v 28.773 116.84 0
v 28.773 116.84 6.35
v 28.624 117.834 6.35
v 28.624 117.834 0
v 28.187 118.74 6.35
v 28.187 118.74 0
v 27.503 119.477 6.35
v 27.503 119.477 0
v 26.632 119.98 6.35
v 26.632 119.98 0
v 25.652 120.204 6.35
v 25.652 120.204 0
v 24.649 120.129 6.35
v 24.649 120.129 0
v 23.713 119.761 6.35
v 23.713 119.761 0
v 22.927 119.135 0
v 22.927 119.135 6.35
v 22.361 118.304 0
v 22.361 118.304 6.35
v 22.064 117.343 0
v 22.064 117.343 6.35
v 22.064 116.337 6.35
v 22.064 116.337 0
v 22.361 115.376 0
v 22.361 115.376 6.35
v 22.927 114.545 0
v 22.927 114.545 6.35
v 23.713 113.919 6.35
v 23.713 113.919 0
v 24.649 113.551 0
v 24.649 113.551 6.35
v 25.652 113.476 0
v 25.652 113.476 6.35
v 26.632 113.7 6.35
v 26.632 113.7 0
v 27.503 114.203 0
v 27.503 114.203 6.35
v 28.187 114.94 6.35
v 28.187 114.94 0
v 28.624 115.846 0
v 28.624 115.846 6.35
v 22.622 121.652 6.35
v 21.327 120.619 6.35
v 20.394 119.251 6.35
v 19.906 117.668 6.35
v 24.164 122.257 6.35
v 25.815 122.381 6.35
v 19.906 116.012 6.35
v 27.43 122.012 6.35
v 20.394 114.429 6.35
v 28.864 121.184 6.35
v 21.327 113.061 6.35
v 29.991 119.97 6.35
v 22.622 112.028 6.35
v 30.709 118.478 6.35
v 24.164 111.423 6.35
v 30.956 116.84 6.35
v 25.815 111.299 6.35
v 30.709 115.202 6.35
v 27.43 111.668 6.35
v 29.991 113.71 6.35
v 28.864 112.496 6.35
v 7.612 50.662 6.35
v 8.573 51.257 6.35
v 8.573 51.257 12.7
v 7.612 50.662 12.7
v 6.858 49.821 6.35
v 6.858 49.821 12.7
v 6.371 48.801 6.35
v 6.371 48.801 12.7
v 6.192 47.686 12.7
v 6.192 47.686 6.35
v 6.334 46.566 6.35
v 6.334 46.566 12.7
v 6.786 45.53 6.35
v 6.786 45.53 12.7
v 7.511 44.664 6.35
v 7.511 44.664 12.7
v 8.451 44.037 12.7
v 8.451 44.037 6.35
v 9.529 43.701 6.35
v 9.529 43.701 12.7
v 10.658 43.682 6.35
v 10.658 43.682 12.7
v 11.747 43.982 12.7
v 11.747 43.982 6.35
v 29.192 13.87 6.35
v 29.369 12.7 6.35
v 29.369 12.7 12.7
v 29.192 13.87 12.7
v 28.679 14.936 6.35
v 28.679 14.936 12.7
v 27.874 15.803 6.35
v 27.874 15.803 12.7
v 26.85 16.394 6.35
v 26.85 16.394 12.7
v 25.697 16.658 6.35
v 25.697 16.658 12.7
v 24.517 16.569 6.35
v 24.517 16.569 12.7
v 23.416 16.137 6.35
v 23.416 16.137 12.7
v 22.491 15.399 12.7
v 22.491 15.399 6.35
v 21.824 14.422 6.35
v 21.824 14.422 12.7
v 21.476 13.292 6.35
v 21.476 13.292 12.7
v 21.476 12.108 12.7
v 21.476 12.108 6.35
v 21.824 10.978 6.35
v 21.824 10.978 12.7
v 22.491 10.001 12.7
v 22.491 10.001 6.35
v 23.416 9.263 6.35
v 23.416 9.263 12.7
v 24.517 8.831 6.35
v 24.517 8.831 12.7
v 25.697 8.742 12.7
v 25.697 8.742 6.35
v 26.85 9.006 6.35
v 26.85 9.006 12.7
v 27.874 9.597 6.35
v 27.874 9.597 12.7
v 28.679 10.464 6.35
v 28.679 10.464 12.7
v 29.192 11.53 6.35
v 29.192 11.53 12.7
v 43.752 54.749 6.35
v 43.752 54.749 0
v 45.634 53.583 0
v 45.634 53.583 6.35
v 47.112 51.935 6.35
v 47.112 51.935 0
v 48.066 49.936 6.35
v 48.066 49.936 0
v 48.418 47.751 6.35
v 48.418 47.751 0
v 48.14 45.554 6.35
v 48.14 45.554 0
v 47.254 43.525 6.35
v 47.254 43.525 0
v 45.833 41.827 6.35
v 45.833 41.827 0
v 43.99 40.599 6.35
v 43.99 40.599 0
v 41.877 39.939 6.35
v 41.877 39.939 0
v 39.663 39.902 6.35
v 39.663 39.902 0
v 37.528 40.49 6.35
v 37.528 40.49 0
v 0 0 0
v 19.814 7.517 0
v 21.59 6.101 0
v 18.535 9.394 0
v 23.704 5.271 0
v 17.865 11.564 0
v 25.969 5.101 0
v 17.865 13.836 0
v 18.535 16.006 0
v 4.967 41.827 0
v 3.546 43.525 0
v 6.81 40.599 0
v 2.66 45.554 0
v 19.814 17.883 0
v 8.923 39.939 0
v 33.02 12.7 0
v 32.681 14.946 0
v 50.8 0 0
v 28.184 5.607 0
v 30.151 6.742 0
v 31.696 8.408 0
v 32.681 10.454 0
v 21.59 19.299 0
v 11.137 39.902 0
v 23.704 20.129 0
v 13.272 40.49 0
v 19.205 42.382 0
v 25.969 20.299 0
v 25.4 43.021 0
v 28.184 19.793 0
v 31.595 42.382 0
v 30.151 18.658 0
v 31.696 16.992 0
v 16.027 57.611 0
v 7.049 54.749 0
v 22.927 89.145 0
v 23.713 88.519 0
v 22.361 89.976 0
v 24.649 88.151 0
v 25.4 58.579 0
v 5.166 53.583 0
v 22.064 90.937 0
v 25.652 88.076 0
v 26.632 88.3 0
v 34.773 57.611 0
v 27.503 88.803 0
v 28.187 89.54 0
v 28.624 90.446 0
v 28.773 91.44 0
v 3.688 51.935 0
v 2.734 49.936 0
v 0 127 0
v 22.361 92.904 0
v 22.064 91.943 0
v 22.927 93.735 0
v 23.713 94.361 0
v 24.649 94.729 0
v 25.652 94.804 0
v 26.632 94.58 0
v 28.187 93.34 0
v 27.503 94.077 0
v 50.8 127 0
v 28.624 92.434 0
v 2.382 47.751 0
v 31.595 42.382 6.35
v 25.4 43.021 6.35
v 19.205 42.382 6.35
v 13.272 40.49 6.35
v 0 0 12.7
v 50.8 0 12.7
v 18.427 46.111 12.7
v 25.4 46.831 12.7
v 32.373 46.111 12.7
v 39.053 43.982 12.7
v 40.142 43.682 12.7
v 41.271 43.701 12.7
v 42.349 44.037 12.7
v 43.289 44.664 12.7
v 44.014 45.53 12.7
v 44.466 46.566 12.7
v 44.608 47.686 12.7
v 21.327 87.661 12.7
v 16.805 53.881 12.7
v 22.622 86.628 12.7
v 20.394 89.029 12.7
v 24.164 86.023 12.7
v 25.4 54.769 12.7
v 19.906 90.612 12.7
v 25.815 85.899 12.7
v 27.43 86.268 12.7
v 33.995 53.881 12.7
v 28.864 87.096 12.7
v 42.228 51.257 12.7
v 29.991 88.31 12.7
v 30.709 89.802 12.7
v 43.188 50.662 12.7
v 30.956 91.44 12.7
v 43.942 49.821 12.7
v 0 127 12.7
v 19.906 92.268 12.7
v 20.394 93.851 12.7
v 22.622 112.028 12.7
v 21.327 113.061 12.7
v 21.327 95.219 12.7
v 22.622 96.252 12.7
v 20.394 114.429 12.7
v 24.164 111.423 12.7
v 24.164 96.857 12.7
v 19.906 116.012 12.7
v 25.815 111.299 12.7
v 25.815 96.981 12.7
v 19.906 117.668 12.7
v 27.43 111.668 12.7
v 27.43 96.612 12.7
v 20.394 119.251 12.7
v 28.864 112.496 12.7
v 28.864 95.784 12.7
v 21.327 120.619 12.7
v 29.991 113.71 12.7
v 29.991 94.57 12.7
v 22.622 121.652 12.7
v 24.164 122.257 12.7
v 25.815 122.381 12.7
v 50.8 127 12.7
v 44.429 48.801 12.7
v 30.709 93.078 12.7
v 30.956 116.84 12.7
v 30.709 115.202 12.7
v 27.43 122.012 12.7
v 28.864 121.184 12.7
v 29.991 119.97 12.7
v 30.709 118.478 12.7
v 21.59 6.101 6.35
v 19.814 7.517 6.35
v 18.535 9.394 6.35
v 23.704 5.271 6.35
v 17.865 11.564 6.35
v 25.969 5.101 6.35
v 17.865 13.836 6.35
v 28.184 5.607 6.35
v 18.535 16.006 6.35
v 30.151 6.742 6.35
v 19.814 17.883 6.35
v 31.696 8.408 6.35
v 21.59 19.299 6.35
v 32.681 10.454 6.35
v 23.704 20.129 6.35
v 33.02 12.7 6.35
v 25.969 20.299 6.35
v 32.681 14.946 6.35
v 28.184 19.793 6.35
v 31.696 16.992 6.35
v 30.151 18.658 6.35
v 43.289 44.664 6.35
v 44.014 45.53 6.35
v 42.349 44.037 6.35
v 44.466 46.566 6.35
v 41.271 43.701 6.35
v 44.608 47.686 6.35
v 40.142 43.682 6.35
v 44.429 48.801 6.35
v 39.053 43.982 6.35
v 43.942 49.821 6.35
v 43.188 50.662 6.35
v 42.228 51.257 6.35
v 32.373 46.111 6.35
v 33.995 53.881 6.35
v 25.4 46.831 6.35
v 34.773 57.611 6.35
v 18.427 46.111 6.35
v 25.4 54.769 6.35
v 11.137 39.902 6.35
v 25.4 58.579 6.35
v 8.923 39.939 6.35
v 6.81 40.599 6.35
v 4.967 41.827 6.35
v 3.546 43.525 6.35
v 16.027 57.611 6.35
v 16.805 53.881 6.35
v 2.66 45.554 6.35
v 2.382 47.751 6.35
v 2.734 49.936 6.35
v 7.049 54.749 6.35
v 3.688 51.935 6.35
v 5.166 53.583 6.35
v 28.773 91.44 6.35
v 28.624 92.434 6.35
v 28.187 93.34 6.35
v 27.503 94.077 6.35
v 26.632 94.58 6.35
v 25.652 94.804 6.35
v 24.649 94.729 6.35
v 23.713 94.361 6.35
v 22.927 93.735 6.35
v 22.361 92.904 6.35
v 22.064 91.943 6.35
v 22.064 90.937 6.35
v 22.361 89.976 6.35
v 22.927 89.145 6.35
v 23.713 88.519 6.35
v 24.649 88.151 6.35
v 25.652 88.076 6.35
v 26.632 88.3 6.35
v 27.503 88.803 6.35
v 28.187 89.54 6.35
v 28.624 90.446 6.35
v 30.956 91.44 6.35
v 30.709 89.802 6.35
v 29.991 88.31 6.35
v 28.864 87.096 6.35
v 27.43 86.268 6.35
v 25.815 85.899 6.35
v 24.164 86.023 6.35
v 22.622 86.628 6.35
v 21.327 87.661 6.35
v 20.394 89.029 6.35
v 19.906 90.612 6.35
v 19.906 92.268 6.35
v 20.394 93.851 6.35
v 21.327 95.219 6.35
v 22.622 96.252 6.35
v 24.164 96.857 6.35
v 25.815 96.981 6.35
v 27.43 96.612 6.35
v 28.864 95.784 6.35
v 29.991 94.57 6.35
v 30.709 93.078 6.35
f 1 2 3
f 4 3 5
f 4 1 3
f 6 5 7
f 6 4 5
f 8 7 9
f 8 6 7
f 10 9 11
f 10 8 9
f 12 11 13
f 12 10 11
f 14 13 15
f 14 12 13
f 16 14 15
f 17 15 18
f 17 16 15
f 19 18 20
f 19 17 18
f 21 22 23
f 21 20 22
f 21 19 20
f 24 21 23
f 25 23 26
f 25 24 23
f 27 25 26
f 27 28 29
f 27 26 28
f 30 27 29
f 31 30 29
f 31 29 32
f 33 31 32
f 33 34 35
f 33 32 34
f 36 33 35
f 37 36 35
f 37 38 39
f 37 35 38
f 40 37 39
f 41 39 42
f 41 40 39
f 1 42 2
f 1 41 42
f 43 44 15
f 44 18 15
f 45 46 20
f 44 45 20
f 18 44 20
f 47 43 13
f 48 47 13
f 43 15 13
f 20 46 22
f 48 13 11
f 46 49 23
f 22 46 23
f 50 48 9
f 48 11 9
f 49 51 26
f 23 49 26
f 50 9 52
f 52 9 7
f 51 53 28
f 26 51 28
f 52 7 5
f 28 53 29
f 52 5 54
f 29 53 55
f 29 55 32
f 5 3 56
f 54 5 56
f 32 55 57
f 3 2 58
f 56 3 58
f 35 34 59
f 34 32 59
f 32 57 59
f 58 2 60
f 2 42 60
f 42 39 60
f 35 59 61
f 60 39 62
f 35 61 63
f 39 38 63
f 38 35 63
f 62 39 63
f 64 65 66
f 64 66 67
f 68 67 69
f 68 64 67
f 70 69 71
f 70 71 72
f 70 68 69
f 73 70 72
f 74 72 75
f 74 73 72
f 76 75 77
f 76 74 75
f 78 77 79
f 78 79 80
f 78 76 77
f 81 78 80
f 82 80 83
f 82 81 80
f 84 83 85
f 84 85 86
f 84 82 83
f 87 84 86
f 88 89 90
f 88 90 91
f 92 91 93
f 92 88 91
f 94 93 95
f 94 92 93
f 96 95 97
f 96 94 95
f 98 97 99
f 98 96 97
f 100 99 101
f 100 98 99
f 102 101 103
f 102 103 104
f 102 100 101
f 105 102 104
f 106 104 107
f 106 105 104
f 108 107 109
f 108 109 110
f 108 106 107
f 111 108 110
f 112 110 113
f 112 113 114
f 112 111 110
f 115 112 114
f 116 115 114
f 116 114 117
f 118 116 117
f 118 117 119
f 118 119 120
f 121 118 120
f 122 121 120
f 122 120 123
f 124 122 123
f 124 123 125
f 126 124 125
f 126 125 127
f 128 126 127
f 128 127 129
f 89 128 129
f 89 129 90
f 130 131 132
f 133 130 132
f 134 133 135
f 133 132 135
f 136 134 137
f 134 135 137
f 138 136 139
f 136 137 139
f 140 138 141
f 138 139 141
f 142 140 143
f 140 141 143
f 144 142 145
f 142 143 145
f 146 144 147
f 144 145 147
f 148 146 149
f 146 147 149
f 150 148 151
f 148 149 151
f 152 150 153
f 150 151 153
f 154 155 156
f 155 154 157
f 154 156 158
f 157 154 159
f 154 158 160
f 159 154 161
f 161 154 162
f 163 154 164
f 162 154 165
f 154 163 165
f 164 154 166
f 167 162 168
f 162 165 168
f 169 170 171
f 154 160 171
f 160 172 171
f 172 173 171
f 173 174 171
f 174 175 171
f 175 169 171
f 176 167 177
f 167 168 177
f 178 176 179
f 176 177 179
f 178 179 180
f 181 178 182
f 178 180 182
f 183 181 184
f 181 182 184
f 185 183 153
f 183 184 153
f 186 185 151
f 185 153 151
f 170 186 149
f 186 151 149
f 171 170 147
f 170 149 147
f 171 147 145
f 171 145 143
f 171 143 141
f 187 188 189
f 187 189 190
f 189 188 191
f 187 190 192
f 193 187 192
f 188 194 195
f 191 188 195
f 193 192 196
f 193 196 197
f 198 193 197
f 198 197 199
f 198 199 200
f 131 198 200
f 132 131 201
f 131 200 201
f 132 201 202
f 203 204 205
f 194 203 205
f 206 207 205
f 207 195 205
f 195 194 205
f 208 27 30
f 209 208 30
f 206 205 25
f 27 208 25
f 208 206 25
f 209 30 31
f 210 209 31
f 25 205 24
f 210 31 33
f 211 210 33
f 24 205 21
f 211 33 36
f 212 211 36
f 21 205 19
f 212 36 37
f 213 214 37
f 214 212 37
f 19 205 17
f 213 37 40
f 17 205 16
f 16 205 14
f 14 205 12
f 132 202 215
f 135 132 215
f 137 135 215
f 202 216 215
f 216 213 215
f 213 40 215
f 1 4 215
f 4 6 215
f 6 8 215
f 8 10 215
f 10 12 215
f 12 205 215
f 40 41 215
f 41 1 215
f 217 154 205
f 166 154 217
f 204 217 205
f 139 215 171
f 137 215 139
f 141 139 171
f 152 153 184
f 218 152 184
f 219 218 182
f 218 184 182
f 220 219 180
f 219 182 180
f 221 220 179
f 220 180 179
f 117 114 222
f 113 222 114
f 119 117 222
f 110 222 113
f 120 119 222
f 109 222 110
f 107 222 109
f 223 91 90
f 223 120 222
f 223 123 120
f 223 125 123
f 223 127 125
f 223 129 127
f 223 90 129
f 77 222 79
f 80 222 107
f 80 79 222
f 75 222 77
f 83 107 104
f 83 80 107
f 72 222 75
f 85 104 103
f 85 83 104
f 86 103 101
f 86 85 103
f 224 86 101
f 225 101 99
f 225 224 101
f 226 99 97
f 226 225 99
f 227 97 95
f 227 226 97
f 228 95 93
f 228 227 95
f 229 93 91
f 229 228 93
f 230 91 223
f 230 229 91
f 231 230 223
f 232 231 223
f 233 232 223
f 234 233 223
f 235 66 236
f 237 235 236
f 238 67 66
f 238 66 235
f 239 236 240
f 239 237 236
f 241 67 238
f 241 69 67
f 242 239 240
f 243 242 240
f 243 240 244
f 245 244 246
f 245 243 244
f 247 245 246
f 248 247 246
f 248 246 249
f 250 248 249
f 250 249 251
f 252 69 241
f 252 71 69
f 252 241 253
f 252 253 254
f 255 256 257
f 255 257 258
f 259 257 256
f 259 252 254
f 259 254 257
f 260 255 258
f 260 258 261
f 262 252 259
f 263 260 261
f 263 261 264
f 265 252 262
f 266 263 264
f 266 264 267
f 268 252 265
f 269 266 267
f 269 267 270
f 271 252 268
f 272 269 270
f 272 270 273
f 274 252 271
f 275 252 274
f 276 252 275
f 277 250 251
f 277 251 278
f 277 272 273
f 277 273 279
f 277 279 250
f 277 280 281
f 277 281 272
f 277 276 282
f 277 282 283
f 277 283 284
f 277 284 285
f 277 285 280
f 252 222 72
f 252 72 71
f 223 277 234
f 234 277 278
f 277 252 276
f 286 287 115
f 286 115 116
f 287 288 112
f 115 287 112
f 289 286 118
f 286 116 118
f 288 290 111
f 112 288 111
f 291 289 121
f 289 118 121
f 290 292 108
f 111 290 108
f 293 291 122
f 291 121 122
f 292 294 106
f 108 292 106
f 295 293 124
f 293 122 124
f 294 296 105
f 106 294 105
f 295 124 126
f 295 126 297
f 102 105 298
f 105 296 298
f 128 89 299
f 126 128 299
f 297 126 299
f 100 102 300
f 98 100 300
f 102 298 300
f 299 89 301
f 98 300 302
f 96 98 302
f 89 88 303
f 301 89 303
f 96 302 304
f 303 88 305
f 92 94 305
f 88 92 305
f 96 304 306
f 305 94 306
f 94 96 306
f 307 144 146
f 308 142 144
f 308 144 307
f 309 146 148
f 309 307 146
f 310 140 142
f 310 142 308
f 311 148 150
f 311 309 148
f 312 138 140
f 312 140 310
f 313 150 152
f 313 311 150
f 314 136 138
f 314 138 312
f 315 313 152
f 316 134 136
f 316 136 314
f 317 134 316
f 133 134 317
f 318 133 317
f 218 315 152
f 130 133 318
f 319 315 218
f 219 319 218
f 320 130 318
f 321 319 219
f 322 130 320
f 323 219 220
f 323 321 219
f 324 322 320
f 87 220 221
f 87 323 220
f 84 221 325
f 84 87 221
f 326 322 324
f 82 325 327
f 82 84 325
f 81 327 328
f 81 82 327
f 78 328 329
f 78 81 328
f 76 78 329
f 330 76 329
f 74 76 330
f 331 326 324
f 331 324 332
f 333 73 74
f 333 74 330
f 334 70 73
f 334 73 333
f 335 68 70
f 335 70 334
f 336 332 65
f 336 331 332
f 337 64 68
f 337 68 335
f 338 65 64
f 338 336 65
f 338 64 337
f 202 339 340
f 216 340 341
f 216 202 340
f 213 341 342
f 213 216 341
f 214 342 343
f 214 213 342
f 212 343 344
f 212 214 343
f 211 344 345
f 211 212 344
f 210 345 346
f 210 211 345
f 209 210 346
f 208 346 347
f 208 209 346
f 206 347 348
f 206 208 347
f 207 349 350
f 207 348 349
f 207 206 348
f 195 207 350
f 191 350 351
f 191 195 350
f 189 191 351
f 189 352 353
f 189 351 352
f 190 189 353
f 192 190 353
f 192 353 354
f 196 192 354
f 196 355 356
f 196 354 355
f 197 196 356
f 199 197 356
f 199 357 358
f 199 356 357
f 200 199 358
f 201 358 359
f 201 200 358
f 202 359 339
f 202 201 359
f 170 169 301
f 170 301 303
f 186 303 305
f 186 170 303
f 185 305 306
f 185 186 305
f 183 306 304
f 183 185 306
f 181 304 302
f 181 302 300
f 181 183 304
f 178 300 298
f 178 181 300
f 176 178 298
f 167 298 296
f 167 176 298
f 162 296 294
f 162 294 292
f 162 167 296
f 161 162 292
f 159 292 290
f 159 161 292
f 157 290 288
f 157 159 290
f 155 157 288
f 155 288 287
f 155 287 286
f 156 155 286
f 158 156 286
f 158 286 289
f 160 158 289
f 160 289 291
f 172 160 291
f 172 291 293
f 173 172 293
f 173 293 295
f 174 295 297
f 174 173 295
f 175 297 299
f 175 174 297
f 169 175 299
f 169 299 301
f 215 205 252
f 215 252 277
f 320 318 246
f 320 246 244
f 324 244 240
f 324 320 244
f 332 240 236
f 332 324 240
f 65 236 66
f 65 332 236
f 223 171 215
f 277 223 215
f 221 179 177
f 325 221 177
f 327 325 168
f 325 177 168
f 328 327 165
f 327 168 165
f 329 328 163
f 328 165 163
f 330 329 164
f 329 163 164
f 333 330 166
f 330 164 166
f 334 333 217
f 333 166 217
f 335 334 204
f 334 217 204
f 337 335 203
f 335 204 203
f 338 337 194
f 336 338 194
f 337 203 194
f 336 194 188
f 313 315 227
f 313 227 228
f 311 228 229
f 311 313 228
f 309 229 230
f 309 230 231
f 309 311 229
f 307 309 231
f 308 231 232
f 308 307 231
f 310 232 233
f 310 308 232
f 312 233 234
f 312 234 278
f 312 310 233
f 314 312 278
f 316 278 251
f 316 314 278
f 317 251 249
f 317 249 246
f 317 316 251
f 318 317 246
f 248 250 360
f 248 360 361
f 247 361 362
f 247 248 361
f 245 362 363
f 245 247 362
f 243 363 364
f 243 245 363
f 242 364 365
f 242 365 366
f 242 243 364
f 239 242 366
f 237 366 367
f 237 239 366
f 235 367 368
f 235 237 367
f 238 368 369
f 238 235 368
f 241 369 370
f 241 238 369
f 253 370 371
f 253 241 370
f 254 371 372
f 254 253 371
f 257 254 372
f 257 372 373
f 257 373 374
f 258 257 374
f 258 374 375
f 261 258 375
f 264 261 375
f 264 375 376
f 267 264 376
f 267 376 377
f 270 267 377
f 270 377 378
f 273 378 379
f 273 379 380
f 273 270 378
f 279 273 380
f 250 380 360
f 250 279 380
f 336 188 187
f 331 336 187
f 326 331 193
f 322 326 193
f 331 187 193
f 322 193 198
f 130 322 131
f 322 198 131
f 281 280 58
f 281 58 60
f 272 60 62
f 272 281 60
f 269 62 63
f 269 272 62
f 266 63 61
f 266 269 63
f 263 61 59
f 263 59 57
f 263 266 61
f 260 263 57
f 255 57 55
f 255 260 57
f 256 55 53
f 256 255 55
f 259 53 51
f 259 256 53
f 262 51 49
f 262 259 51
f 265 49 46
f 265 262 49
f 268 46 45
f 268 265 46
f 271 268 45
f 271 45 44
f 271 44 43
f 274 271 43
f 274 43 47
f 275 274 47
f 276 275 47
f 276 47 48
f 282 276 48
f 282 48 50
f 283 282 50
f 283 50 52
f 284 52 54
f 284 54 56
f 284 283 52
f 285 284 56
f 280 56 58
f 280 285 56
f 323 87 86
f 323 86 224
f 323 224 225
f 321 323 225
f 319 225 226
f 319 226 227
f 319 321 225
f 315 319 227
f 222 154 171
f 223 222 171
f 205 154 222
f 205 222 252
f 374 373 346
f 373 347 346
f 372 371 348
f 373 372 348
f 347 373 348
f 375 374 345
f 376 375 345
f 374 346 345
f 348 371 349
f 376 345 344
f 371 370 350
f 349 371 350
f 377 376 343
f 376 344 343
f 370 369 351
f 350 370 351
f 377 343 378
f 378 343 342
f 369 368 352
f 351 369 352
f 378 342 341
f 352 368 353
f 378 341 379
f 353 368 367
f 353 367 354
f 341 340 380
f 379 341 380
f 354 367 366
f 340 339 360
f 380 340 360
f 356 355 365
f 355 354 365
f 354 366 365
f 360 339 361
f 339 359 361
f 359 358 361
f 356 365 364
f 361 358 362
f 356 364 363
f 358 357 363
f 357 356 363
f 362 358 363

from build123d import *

# Parameters (mm, degrees)
SKETCH1_W           = 50.8
SKETCH1_H           = 127
SKETCH1_R           = 3.96875
SKETCH1_R_2         = 3.3734375
BOSS_EXTRUDE2_DEPTH = 12.7
CUT_EXTRUDE1_DEPTH  = 6.35
CUT_EXTRUDE2_START  = -12.7
SKETCH3_R           = 5.55625
CUT_EXTRUDE2_DEPTH  = 6.35
CUT_EXTRUDE3_START  = -12.7
SKETCH4_R           = 7.62
CUT_EXTRUDE3_DEPTH  = 6.35


with BuildPart() as part:
    # Sketch1 → Boss-Extrude2 (new body)
    with BuildSketch(Plane.XY):
        with Locations((25.4, 63.5)):
            Rectangle(SKETCH1_W, SKETCH1_H)
        with Locations((25.4, 12.7)):
            Circle(SKETCH1_R, mode=Mode.SUBTRACT)
        with Locations((25.4, 116.84)):
            Circle(SKETCH1_R_2, mode=Mode.SUBTRACT)
        with Locations((25.4, 91.44)):
            Circle(SKETCH1_R_2, mode=Mode.SUBTRACT)
        with BuildLine():
            ThreePointArc((42.2275, 51.256646253), (25.4, 54.76875), (8.5725, 51.256646253))
            ThreePointArc((8.5725, 51.256646253), (6.522580542, 46.031726796), (11.7475, 43.981807338))
            ThreePointArc((11.7475, 43.981807338), (25.4, 46.83125), (39.0525, 43.981807338))
            ThreePointArc((39.0525, 43.981807338), (44.277419458, 46.031726796), (42.2275, 51.256646253))
        make_face(mode=Mode.SUBTRACT)
    extrude(amount=BOSS_EXTRUDE2_DEPTH)

    # Sketch1<3> → Cut-Extrude1 (cut)
    with BuildSketch(Plane.XY):
        with BuildLine():
            ThreePointArc((37.5285, 40.489884658), (25.4, 43.02125), (13.2715, 40.489884658))
            ThreePointArc((13.2715, 40.489884658), (3.030657863, 44.507726796), (7.0485, 54.748568933))
            ThreePointArc((7.0485, 54.748568933), (25.4, 58.57875), (43.7515, 54.748568933))
            ThreePointArc((43.7515, 54.748568933), (47.769342137, 44.507726796), (37.5285, 40.489884658))
        make_face()
        with BuildLine():
            ThreePointArc((39.0525, 43.981807338), (44.277419458, 46.031726796), (42.2275, 51.256646253))
            ThreePointArc((42.2275, 51.256646253), (25.4, 54.76875), (8.5725, 51.256646253))
            ThreePointArc((8.5725, 51.256646253), (6.522580542, 46.031726796), (11.7475, 43.981807338))
            ThreePointArc((11.7475, 43.981807338), (25.4, 46.83125), (39.0525, 43.981807338))
        make_face(mode=Mode.SUBTRACT)
    extrude(amount=CUT_EXTRUDE1_DEPTH, mode=Mode.SUBTRACT)

    # Sketch3 → Cut-Extrude2 (cut)
    with BuildSketch(Plane(origin=(0, 0, 0), x_dir=(-1, 0, 0), z_dir=(0, 0, -1)).offset(CUT_EXTRUDE2_START)):
        with Locations(Location((-25.4, 116.84, 0), (0, 0, 180))):
            Circle(SKETCH3_R)
        with Locations(Location((-25.4, 91.44, 0), (0, 0, 180))):
            Circle(SKETCH3_R)
    extrude(amount=CUT_EXTRUDE2_DEPTH, mode=Mode.SUBTRACT)

    # Sketch4 → Cut-Extrude3 (cut)
    with BuildSketch(Plane.XY.offset(12.7).offset(CUT_EXTRUDE3_START)):
        with Locations((25.4, 12.7)):
            Circle(SKETCH4_R)
    extrude(amount=CUT_EXTRUDE3_DEPTH, mode=Mode.SUBTRACT)


solid = part.part
